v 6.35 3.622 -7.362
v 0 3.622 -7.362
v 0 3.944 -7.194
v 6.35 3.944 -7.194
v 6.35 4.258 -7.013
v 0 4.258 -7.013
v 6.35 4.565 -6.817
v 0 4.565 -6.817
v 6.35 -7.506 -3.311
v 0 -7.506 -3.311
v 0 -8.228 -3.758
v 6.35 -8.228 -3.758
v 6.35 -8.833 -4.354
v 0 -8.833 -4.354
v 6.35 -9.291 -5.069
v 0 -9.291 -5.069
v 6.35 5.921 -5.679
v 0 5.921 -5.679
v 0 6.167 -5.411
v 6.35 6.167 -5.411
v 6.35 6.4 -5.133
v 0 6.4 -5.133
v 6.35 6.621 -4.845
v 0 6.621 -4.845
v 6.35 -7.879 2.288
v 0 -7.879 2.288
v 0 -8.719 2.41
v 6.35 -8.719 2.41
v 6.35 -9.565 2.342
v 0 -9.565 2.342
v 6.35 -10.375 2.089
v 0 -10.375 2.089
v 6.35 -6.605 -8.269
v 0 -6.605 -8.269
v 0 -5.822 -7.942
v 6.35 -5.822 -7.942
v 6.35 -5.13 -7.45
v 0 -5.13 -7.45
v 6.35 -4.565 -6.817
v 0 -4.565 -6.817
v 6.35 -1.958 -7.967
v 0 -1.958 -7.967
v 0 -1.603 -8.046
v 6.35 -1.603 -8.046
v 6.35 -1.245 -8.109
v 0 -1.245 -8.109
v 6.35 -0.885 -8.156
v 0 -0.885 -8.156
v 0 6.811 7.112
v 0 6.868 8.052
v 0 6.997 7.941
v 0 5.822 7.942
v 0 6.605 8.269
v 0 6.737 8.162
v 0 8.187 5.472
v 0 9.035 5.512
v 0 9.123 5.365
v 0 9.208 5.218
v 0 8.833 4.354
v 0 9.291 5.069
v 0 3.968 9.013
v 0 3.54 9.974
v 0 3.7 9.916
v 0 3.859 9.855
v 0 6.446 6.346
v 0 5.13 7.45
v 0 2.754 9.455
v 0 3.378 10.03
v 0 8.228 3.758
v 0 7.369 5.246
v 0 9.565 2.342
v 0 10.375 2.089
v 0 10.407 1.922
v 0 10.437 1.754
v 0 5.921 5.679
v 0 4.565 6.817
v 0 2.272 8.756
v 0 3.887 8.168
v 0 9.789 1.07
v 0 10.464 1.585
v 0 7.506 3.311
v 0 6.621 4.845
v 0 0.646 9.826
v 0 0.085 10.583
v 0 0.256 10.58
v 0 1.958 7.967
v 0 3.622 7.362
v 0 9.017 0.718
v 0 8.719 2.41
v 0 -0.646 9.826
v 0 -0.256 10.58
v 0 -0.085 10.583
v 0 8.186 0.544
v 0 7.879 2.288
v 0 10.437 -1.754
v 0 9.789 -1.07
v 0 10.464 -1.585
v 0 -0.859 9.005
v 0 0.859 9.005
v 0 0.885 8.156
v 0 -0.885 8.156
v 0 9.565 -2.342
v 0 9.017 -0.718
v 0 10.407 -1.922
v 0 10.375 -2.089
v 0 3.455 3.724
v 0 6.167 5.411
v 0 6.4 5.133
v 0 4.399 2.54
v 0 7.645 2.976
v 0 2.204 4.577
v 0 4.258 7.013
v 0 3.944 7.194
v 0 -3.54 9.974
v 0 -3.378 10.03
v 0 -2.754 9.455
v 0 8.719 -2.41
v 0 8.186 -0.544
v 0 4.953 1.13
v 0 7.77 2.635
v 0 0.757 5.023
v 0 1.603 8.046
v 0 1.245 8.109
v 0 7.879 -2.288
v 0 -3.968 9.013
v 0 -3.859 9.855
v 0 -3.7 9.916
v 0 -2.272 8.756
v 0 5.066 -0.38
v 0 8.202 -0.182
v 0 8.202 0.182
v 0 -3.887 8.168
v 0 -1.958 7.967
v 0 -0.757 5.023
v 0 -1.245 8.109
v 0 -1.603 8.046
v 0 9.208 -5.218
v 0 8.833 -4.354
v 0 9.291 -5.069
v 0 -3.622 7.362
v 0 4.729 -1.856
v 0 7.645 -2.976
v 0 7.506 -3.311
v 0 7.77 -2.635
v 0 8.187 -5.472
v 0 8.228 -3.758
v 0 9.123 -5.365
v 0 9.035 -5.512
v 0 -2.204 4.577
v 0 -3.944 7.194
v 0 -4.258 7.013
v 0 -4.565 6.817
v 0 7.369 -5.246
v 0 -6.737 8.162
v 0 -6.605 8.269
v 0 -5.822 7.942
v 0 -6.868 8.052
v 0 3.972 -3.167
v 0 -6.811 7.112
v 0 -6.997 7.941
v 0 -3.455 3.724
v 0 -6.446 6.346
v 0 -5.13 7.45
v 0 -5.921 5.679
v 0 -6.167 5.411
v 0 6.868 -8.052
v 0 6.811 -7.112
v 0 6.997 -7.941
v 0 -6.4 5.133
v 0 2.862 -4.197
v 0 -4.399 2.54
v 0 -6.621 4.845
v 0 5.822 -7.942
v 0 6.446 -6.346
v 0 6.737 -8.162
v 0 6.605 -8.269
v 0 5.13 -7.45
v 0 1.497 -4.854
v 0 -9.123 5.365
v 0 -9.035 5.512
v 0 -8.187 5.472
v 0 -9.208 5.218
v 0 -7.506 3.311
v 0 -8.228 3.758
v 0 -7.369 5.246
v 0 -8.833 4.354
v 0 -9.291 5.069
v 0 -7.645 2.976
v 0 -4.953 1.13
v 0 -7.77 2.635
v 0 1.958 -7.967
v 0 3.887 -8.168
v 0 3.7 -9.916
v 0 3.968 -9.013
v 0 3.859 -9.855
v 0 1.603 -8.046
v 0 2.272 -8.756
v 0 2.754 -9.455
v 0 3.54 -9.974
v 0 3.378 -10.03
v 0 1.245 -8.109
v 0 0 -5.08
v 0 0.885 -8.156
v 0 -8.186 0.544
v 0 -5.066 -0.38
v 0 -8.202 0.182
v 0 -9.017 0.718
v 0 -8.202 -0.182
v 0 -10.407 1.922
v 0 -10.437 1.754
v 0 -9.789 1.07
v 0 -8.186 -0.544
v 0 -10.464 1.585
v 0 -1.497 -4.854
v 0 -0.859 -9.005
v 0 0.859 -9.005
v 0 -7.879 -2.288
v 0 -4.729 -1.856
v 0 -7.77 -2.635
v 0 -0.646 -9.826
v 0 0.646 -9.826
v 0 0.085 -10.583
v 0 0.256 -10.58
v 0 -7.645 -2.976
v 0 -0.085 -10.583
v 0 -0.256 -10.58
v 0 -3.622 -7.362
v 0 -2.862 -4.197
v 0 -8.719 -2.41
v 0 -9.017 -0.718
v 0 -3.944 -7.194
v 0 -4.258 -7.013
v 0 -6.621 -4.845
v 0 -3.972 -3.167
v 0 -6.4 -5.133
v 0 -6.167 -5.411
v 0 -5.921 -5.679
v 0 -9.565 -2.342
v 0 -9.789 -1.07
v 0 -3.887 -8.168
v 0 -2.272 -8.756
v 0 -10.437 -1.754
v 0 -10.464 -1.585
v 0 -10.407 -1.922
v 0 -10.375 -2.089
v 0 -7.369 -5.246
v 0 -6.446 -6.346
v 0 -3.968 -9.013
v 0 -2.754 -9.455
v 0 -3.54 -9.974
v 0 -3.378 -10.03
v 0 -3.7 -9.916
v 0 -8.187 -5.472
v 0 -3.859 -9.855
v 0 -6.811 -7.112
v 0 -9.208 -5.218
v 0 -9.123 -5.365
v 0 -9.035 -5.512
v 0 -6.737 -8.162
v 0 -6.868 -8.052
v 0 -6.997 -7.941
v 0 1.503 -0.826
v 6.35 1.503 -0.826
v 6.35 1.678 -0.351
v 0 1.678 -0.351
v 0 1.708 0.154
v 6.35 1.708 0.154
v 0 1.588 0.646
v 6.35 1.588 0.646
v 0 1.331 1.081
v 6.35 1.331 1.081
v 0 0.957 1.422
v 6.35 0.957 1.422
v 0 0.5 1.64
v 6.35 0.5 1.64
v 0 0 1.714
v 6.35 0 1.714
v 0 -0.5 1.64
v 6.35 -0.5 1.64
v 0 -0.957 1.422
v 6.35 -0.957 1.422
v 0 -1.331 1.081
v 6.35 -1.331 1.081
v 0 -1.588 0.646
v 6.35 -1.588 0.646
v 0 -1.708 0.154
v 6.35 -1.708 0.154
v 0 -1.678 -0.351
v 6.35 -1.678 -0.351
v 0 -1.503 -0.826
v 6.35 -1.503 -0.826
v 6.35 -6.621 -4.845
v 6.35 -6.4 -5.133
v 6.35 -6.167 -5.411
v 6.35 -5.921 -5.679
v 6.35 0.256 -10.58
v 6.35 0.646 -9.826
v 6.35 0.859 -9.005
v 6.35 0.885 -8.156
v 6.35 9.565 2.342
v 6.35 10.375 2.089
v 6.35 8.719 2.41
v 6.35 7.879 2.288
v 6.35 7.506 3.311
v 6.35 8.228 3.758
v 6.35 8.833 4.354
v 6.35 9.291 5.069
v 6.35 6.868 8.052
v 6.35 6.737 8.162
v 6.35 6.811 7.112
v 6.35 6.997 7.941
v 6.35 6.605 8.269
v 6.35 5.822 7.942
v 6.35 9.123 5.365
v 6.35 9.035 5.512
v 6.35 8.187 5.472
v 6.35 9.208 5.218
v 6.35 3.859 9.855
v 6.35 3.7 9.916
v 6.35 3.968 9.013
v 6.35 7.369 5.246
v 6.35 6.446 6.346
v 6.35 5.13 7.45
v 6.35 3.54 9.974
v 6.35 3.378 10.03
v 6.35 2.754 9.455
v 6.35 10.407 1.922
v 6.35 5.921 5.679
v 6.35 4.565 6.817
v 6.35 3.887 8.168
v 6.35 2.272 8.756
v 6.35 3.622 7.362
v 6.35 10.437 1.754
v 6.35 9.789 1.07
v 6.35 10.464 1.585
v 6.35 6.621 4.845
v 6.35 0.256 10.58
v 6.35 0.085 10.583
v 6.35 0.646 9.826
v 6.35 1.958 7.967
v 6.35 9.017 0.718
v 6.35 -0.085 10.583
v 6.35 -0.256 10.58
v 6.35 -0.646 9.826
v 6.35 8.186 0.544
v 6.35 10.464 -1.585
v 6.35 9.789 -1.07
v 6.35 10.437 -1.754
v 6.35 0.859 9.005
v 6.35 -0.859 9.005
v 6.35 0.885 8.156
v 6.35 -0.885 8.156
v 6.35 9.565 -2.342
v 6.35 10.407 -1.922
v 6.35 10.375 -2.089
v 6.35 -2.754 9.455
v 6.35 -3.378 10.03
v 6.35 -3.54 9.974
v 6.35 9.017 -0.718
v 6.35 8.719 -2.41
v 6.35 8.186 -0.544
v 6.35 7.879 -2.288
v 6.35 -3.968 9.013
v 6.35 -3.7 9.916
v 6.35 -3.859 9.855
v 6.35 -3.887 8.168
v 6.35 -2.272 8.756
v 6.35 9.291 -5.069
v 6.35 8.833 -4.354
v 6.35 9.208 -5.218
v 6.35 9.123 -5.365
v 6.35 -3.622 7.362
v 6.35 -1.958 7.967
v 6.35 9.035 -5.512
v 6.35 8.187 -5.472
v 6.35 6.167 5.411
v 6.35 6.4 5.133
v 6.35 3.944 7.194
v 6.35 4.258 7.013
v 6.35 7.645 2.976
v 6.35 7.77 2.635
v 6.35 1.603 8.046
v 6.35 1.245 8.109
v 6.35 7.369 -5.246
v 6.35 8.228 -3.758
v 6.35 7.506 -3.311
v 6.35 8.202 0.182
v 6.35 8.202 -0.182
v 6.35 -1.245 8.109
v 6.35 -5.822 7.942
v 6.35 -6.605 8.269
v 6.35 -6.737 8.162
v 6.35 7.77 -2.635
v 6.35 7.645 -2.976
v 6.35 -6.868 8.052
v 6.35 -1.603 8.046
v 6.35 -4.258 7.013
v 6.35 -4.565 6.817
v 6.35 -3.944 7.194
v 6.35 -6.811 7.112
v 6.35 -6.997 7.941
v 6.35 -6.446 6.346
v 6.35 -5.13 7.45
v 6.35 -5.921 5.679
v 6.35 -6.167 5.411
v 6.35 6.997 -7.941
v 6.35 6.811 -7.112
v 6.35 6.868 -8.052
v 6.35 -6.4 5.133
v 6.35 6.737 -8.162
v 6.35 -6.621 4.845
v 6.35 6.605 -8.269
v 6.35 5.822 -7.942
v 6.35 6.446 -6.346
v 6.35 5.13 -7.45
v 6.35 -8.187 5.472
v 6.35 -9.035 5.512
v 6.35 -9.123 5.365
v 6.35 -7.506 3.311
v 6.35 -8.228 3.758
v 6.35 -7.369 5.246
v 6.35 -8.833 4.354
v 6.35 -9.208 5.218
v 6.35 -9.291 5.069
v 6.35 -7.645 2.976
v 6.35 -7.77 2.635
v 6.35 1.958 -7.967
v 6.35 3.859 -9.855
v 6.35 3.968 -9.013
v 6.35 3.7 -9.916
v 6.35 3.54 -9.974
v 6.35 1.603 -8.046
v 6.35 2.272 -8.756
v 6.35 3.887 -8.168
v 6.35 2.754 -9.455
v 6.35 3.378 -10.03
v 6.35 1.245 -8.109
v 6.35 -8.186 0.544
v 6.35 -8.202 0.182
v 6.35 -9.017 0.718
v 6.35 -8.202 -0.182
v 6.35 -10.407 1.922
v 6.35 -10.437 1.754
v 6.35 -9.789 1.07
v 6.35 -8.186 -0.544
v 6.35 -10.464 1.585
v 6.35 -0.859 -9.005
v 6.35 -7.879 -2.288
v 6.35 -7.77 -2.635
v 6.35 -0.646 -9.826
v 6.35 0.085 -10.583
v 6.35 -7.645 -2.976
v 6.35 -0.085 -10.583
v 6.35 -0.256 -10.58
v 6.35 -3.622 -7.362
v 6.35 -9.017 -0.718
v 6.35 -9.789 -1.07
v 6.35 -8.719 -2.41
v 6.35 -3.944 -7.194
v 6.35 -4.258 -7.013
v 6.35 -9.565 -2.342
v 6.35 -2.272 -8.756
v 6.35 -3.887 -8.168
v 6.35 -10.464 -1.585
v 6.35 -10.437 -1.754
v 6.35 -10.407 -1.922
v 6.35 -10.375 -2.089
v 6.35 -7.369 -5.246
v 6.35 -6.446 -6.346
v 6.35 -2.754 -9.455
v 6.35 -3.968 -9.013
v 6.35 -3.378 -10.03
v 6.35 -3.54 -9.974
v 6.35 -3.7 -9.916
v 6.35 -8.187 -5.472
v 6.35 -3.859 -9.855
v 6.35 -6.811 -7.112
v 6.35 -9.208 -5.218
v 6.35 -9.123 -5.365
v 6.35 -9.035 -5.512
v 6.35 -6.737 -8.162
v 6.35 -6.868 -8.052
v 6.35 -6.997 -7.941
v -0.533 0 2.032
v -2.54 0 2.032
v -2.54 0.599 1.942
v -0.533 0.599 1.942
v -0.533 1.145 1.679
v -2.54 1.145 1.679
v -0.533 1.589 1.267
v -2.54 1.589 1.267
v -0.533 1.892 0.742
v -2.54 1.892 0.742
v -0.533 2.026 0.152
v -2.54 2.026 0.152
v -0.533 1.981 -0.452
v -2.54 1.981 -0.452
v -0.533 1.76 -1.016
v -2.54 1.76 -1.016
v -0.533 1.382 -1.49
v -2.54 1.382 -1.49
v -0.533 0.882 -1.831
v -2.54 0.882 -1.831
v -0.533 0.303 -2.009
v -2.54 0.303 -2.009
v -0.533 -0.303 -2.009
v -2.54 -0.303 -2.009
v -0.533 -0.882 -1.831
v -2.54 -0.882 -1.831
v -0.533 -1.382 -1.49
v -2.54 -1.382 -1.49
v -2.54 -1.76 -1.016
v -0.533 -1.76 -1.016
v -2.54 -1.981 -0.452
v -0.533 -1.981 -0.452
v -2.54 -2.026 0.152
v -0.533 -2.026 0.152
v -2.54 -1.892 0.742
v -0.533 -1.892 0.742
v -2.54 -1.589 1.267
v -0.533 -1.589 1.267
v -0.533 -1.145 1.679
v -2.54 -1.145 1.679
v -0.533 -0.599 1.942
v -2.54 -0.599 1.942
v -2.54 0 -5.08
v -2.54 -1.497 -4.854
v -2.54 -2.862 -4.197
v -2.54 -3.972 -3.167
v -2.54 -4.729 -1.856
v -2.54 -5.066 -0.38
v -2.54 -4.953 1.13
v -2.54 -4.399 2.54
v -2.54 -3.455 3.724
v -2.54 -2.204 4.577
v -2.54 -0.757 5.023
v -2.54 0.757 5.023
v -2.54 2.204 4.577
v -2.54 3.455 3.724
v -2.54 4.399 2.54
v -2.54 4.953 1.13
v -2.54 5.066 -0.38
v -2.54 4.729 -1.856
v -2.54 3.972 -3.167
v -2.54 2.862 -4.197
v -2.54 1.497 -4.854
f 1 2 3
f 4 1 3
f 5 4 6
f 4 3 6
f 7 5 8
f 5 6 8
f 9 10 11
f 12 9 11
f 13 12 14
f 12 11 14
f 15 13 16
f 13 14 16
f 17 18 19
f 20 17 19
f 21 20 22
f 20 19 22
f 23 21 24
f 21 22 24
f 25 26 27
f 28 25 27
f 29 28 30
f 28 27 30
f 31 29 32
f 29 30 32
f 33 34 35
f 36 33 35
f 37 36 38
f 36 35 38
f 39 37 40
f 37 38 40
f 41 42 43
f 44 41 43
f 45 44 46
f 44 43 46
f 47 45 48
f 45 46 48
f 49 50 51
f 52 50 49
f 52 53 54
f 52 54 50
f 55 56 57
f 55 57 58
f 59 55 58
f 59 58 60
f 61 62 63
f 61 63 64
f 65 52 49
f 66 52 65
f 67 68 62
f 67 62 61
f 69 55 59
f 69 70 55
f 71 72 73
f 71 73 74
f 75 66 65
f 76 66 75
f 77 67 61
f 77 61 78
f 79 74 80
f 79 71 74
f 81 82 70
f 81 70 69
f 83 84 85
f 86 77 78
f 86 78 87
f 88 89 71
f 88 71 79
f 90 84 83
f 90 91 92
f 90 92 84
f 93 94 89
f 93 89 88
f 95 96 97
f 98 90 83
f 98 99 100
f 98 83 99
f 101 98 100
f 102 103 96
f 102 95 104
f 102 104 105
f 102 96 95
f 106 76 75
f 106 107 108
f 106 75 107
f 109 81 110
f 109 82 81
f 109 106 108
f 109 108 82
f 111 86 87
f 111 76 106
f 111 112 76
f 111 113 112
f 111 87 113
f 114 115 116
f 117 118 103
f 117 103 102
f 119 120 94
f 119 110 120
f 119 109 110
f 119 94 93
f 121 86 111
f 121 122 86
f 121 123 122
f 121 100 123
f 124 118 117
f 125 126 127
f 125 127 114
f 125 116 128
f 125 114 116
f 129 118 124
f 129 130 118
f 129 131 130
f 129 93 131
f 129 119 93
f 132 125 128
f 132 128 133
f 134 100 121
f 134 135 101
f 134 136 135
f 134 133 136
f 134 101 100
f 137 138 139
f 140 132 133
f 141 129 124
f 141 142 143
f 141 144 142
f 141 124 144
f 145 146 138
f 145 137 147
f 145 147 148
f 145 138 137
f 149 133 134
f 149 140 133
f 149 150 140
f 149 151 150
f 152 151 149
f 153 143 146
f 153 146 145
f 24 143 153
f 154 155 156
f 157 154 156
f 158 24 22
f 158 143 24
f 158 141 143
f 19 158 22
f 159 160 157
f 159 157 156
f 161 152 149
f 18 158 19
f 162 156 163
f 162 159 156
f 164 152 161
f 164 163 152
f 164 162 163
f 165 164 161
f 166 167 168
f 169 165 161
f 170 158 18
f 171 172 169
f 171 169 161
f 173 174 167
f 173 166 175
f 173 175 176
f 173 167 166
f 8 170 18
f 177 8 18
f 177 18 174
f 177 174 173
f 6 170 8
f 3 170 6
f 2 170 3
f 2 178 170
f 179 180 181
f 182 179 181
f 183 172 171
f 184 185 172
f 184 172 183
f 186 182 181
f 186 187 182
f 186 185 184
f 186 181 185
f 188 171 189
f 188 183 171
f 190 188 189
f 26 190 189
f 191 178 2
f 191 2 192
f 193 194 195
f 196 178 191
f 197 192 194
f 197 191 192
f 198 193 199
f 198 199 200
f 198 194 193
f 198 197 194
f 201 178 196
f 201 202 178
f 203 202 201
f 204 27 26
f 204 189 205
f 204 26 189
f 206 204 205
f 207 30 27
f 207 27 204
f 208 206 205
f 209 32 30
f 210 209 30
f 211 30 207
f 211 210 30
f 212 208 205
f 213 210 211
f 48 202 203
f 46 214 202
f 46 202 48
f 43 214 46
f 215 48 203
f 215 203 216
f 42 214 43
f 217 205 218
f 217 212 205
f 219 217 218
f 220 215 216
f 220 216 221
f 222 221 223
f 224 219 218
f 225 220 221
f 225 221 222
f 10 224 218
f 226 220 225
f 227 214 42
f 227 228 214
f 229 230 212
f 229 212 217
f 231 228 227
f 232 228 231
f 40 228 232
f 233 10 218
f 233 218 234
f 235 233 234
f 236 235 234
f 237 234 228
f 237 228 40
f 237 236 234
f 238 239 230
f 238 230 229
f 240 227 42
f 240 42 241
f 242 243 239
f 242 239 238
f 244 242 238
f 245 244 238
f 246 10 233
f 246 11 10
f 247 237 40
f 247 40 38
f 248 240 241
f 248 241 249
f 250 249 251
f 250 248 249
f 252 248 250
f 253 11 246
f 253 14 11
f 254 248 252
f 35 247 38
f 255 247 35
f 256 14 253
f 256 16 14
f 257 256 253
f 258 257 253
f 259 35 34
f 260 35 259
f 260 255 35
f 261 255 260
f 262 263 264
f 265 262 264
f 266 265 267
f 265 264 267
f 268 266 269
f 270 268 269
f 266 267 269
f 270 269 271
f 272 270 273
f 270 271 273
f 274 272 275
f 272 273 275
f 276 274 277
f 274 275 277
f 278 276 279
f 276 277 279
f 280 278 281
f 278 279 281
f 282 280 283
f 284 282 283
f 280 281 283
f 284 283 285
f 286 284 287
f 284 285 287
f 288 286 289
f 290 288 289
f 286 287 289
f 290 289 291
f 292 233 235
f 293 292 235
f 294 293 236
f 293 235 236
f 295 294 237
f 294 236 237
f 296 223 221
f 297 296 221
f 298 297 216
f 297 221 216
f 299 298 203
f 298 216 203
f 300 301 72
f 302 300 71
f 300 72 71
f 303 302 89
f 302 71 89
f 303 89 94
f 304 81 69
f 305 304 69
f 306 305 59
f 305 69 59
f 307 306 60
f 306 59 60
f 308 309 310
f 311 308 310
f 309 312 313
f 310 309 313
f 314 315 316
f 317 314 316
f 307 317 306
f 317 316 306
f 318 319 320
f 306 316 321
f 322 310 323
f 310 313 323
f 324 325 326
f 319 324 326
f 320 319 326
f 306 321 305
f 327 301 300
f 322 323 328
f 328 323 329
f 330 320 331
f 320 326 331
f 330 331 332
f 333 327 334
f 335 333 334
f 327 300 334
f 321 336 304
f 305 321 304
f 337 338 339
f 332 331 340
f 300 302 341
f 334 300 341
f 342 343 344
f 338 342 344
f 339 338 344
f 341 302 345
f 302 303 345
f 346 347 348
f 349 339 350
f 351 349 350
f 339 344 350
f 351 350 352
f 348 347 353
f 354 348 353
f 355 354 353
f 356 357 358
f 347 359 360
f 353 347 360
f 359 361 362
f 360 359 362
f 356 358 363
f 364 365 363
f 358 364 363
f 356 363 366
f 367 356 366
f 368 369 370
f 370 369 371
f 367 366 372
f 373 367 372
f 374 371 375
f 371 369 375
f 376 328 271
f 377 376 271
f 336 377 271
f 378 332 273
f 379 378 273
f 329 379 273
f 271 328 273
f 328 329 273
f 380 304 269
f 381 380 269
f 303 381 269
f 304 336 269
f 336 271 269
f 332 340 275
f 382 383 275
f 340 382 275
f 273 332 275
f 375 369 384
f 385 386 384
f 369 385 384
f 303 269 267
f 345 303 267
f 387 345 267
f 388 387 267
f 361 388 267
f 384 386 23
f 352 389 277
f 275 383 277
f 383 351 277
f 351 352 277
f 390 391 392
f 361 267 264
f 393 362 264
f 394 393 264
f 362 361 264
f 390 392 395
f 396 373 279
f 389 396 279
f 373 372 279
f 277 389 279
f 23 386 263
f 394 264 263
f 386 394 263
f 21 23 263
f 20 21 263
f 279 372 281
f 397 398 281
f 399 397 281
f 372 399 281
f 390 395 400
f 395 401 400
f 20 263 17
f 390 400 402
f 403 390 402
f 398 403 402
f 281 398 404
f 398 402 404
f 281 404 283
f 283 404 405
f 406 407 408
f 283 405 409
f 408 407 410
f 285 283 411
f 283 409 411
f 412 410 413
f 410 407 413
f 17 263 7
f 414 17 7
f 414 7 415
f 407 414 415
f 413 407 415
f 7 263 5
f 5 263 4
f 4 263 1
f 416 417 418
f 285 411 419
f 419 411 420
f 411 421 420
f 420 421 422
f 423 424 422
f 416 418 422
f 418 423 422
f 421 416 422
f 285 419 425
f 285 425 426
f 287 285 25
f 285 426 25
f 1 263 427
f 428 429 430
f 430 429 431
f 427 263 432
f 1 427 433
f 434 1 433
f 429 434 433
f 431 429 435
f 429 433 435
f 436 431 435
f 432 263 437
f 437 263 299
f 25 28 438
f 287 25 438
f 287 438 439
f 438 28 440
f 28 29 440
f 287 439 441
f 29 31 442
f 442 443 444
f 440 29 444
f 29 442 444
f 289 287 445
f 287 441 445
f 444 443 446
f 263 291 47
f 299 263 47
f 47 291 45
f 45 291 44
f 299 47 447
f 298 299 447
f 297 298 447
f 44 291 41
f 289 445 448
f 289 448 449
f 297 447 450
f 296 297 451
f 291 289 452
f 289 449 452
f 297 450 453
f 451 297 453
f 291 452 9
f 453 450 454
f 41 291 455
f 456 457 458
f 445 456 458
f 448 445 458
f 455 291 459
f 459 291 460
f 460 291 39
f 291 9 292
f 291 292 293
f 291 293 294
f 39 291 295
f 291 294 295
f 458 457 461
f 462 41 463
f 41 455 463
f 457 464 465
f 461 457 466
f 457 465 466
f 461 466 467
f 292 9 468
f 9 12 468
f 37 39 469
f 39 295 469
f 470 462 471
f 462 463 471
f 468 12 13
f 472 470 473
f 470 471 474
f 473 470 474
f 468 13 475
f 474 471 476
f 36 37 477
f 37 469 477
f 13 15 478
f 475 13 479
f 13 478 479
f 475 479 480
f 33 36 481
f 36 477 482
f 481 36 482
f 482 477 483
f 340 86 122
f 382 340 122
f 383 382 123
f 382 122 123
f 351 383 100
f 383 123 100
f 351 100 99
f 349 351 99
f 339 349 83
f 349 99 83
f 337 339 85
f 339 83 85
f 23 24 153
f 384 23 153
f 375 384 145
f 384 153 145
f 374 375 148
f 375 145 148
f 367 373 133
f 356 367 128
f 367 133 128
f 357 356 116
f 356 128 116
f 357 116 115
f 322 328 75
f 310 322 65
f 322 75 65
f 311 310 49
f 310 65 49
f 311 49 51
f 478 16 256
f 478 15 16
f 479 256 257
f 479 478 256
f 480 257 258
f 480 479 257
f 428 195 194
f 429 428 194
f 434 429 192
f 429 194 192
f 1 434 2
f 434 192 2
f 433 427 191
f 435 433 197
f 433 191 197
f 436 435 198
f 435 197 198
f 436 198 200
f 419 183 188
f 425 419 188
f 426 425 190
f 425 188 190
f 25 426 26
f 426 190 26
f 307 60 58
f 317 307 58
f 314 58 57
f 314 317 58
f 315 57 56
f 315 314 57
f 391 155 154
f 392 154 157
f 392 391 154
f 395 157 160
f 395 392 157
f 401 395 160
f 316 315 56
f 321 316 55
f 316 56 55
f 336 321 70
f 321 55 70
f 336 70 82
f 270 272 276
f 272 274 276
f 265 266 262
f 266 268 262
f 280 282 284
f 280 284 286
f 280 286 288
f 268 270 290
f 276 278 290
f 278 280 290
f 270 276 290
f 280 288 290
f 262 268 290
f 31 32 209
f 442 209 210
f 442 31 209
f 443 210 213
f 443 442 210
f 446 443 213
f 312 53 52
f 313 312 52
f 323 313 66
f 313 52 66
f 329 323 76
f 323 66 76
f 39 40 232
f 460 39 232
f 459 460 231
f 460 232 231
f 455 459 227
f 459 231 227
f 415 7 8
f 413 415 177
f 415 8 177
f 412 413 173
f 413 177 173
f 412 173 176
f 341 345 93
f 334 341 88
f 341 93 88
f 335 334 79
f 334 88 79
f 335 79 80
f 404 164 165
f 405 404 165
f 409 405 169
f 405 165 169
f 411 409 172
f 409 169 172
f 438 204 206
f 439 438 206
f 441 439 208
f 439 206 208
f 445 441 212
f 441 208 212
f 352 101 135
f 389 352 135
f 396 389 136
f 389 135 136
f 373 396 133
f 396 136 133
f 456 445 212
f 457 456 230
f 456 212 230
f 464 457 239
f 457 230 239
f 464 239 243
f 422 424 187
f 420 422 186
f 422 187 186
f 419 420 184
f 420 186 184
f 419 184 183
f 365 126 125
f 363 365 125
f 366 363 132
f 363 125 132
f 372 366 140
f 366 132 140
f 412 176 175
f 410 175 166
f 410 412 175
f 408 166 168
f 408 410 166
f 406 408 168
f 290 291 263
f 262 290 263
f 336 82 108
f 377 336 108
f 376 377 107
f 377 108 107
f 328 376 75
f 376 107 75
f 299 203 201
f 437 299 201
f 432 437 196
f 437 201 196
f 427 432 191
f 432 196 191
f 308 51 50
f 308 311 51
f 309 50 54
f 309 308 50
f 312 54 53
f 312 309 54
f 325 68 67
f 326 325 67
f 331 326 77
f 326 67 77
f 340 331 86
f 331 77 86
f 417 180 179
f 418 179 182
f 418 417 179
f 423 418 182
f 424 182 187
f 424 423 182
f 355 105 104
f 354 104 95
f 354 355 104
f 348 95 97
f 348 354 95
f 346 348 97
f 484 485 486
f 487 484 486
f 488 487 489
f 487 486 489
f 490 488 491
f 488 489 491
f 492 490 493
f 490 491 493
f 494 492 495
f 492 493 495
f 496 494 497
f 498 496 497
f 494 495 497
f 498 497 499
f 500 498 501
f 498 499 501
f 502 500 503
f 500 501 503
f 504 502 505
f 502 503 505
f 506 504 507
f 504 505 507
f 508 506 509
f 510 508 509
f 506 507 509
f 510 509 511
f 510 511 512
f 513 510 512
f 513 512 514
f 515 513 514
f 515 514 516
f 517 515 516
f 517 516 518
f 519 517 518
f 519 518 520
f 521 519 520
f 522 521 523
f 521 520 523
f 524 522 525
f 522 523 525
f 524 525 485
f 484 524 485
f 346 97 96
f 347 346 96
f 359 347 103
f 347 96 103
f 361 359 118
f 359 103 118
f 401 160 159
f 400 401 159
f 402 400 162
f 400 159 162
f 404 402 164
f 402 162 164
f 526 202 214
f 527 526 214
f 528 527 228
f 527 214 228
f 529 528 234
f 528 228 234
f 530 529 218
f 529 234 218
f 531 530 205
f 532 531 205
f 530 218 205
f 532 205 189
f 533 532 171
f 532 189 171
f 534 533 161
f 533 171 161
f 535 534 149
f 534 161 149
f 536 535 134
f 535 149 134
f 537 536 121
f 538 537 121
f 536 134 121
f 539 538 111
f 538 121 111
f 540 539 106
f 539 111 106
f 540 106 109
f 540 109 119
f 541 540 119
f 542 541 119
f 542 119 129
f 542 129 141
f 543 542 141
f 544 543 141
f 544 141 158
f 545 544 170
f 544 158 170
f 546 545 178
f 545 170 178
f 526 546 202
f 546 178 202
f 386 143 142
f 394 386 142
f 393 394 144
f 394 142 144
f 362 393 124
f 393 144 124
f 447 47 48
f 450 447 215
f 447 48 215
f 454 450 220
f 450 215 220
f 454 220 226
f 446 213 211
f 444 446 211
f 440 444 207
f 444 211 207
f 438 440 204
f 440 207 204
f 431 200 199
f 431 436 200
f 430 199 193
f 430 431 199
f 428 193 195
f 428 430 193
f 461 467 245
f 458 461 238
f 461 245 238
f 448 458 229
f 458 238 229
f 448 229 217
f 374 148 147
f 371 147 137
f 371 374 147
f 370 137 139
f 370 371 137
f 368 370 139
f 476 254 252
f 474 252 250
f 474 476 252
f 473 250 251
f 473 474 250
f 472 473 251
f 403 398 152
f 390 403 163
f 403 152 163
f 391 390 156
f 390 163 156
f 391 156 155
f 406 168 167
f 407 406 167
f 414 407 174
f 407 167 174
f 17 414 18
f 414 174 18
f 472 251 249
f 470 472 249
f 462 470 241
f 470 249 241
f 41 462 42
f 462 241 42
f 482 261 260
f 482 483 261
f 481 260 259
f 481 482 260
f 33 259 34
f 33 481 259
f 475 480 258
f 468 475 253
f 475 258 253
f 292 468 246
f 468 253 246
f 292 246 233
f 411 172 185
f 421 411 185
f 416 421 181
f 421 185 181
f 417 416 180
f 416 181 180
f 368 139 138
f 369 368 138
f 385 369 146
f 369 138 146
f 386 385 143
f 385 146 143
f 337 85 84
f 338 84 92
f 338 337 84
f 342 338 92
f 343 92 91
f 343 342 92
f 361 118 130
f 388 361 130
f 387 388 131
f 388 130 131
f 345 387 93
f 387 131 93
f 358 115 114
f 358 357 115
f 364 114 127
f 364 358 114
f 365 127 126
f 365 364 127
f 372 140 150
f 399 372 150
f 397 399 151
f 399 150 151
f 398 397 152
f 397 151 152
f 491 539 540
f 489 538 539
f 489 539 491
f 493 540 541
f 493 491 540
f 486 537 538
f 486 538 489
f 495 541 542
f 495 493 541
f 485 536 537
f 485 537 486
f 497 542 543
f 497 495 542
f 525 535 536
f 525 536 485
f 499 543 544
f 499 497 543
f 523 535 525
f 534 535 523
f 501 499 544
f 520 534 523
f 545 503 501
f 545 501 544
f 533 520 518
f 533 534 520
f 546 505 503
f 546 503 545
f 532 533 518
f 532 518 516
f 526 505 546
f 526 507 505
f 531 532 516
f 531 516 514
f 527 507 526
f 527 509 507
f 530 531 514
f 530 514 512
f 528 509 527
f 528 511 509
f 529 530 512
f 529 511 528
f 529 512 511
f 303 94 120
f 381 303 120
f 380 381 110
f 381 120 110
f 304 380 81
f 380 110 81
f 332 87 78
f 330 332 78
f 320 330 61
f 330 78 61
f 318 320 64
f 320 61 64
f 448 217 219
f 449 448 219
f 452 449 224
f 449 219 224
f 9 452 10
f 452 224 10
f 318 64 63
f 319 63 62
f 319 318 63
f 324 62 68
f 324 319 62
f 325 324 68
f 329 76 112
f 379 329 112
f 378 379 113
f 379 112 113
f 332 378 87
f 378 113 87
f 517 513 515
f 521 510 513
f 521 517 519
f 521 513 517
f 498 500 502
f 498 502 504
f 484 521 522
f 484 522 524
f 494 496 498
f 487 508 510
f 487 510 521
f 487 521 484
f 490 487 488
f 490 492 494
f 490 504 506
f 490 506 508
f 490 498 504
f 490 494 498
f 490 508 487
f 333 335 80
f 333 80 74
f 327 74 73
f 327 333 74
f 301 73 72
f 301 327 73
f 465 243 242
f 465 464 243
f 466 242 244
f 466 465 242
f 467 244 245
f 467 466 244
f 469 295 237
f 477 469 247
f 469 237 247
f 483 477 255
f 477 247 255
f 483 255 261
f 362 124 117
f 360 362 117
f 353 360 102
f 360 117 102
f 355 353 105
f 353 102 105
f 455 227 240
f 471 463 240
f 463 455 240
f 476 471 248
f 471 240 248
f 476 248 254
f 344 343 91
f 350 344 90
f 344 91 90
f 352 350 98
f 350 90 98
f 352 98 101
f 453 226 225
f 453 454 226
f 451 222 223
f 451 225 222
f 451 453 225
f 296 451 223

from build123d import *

# Parameters (mm, degrees)
BASPROSKE_W         = 6.35
BASPROSKE_H         = 10.583333333
TOOTHCUT_DEPTH      = 17.258425166
TEETHCUTS_COUNT     = 18
TEETHCUTS_ANGLE     = 340
BORSKE_R            = 0.396875
BORE_DEPTH          = 50.8000508
CUT_EXTRUDE1_DEPTH  = 17.180937051
SKETCH2_R           = 5.08
BOSS_EXTRUDE1_DEPTH = 2.54
SKETCH3_R           = 2.032
CUT_EXTRUDE2_DEPTH  = 2.0066


with BuildPart() as part:
    # BasProSke → Base-Revolve (revolve)
    with BuildSketch(Plane(origin=(0, 0, 0), x_dir=(1, 0, 0), z_dir=(0, 1, 0)), mode=Mode.PRIVATE) as base_revolve_sk:
        with Locations((3.175, 5.291666667)):
            Rectangle(BASPROSKE_W, BASPROSKE_H)
    revolve(base_revolve_sk.sketch.rotate(Axis((-10, 0, 0), (1, 0, 0)), 180), axis=Axis((-10, 0, 0), (1, 0, 0)))

    # TooCutSke → ToothCut (cut, through all)
    with BuildSketch(Plane(origin=(0, 0, 0), x_dir=(0, 0, -1), z_dir=(1, 0, 0))):
        with BuildLine():
            ThreePointArc((0.544428341, 8.186116016), (0, 8.2042), (-0.544428341, 8.186116016))
            ThreePointArc((-0.544428341, 8.186116016), (-0.878937427, 9.427133228), (-1.607072268, 10.486302574))
            ThreePointArc((-1.607072268, 10.486302574), (0, 10.608733333), (1.607072268, 10.486302574))
            ThreePointArc((1.607072268, 10.486302574), (0.878937427, 9.427133228), (0.544428341, 8.186116016))
        make_face()
    toothcut = extrude(amount=TOOTHCUT_DEPTH, mode=Mode.SUBTRACT)

    # TeethCuts: ToothCut ×18 about axis
    teethcuts_axis = Axis((-10, 0, 0), (1, 0, 0))
    for i in range(1, TEETHCUTS_COUNT):
        add(toothcut.rotate(teethcuts_axis, i * TEETHCUTS_ANGLE / (TEETHCUTS_COUNT - 1)), mode=Mode.SUBTRACT)

    # BorSke → Bore (cut, symmetric)
    with BuildSketch(Plane(origin=(0, 0, 0), x_dir=(0, 0, -1), z_dir=(1, 0, 0))):
        with Locations(Location((0, 0, 0), (0, 0, 180))):
            Circle(BORSKE_R)
    extrude(amount=BORE_DEPTH, both=True, mode=Mode.SUBTRACT)

    # Sketch1 → Cut-Extrude1 (cut, through all)
    with BuildSketch(Plane(origin=(6.35, 0, 0), x_dir=(0, 0, -1), z_dir=(1, 0, 0))):
        with BuildLine():
            Line((0.8255, -1.502684265), (0.8255, 1.502684265))
            ThreePointArc((0.8255, 1.502684265), (-1.7145, 0), (0.8255, -1.502684265))
        make_face()
    extrude(amount=-CUT_EXTRUDE1_DEPTH, mode=Mode.SUBTRACT)

    # Sketch2 → Boss-Extrude1 (add)
    with BuildSketch(Plane.ZY):
        with Locations(Location((0, 0, 0), (0, 0, 180))):
            Circle(SKETCH2_R)
    extrude(amount=BOSS_EXTRUDE1_DEPTH)

    # Sketch3 → Cut-Extrude2 (cut)
    with BuildSketch(Plane.ZY.offset(2.54)):
        Circle(SKETCH3_R)
    extrude(amount=-CUT_EXTRUDE2_DEPTH, mode=Mode.SUBTRACT)


solid = part.part
